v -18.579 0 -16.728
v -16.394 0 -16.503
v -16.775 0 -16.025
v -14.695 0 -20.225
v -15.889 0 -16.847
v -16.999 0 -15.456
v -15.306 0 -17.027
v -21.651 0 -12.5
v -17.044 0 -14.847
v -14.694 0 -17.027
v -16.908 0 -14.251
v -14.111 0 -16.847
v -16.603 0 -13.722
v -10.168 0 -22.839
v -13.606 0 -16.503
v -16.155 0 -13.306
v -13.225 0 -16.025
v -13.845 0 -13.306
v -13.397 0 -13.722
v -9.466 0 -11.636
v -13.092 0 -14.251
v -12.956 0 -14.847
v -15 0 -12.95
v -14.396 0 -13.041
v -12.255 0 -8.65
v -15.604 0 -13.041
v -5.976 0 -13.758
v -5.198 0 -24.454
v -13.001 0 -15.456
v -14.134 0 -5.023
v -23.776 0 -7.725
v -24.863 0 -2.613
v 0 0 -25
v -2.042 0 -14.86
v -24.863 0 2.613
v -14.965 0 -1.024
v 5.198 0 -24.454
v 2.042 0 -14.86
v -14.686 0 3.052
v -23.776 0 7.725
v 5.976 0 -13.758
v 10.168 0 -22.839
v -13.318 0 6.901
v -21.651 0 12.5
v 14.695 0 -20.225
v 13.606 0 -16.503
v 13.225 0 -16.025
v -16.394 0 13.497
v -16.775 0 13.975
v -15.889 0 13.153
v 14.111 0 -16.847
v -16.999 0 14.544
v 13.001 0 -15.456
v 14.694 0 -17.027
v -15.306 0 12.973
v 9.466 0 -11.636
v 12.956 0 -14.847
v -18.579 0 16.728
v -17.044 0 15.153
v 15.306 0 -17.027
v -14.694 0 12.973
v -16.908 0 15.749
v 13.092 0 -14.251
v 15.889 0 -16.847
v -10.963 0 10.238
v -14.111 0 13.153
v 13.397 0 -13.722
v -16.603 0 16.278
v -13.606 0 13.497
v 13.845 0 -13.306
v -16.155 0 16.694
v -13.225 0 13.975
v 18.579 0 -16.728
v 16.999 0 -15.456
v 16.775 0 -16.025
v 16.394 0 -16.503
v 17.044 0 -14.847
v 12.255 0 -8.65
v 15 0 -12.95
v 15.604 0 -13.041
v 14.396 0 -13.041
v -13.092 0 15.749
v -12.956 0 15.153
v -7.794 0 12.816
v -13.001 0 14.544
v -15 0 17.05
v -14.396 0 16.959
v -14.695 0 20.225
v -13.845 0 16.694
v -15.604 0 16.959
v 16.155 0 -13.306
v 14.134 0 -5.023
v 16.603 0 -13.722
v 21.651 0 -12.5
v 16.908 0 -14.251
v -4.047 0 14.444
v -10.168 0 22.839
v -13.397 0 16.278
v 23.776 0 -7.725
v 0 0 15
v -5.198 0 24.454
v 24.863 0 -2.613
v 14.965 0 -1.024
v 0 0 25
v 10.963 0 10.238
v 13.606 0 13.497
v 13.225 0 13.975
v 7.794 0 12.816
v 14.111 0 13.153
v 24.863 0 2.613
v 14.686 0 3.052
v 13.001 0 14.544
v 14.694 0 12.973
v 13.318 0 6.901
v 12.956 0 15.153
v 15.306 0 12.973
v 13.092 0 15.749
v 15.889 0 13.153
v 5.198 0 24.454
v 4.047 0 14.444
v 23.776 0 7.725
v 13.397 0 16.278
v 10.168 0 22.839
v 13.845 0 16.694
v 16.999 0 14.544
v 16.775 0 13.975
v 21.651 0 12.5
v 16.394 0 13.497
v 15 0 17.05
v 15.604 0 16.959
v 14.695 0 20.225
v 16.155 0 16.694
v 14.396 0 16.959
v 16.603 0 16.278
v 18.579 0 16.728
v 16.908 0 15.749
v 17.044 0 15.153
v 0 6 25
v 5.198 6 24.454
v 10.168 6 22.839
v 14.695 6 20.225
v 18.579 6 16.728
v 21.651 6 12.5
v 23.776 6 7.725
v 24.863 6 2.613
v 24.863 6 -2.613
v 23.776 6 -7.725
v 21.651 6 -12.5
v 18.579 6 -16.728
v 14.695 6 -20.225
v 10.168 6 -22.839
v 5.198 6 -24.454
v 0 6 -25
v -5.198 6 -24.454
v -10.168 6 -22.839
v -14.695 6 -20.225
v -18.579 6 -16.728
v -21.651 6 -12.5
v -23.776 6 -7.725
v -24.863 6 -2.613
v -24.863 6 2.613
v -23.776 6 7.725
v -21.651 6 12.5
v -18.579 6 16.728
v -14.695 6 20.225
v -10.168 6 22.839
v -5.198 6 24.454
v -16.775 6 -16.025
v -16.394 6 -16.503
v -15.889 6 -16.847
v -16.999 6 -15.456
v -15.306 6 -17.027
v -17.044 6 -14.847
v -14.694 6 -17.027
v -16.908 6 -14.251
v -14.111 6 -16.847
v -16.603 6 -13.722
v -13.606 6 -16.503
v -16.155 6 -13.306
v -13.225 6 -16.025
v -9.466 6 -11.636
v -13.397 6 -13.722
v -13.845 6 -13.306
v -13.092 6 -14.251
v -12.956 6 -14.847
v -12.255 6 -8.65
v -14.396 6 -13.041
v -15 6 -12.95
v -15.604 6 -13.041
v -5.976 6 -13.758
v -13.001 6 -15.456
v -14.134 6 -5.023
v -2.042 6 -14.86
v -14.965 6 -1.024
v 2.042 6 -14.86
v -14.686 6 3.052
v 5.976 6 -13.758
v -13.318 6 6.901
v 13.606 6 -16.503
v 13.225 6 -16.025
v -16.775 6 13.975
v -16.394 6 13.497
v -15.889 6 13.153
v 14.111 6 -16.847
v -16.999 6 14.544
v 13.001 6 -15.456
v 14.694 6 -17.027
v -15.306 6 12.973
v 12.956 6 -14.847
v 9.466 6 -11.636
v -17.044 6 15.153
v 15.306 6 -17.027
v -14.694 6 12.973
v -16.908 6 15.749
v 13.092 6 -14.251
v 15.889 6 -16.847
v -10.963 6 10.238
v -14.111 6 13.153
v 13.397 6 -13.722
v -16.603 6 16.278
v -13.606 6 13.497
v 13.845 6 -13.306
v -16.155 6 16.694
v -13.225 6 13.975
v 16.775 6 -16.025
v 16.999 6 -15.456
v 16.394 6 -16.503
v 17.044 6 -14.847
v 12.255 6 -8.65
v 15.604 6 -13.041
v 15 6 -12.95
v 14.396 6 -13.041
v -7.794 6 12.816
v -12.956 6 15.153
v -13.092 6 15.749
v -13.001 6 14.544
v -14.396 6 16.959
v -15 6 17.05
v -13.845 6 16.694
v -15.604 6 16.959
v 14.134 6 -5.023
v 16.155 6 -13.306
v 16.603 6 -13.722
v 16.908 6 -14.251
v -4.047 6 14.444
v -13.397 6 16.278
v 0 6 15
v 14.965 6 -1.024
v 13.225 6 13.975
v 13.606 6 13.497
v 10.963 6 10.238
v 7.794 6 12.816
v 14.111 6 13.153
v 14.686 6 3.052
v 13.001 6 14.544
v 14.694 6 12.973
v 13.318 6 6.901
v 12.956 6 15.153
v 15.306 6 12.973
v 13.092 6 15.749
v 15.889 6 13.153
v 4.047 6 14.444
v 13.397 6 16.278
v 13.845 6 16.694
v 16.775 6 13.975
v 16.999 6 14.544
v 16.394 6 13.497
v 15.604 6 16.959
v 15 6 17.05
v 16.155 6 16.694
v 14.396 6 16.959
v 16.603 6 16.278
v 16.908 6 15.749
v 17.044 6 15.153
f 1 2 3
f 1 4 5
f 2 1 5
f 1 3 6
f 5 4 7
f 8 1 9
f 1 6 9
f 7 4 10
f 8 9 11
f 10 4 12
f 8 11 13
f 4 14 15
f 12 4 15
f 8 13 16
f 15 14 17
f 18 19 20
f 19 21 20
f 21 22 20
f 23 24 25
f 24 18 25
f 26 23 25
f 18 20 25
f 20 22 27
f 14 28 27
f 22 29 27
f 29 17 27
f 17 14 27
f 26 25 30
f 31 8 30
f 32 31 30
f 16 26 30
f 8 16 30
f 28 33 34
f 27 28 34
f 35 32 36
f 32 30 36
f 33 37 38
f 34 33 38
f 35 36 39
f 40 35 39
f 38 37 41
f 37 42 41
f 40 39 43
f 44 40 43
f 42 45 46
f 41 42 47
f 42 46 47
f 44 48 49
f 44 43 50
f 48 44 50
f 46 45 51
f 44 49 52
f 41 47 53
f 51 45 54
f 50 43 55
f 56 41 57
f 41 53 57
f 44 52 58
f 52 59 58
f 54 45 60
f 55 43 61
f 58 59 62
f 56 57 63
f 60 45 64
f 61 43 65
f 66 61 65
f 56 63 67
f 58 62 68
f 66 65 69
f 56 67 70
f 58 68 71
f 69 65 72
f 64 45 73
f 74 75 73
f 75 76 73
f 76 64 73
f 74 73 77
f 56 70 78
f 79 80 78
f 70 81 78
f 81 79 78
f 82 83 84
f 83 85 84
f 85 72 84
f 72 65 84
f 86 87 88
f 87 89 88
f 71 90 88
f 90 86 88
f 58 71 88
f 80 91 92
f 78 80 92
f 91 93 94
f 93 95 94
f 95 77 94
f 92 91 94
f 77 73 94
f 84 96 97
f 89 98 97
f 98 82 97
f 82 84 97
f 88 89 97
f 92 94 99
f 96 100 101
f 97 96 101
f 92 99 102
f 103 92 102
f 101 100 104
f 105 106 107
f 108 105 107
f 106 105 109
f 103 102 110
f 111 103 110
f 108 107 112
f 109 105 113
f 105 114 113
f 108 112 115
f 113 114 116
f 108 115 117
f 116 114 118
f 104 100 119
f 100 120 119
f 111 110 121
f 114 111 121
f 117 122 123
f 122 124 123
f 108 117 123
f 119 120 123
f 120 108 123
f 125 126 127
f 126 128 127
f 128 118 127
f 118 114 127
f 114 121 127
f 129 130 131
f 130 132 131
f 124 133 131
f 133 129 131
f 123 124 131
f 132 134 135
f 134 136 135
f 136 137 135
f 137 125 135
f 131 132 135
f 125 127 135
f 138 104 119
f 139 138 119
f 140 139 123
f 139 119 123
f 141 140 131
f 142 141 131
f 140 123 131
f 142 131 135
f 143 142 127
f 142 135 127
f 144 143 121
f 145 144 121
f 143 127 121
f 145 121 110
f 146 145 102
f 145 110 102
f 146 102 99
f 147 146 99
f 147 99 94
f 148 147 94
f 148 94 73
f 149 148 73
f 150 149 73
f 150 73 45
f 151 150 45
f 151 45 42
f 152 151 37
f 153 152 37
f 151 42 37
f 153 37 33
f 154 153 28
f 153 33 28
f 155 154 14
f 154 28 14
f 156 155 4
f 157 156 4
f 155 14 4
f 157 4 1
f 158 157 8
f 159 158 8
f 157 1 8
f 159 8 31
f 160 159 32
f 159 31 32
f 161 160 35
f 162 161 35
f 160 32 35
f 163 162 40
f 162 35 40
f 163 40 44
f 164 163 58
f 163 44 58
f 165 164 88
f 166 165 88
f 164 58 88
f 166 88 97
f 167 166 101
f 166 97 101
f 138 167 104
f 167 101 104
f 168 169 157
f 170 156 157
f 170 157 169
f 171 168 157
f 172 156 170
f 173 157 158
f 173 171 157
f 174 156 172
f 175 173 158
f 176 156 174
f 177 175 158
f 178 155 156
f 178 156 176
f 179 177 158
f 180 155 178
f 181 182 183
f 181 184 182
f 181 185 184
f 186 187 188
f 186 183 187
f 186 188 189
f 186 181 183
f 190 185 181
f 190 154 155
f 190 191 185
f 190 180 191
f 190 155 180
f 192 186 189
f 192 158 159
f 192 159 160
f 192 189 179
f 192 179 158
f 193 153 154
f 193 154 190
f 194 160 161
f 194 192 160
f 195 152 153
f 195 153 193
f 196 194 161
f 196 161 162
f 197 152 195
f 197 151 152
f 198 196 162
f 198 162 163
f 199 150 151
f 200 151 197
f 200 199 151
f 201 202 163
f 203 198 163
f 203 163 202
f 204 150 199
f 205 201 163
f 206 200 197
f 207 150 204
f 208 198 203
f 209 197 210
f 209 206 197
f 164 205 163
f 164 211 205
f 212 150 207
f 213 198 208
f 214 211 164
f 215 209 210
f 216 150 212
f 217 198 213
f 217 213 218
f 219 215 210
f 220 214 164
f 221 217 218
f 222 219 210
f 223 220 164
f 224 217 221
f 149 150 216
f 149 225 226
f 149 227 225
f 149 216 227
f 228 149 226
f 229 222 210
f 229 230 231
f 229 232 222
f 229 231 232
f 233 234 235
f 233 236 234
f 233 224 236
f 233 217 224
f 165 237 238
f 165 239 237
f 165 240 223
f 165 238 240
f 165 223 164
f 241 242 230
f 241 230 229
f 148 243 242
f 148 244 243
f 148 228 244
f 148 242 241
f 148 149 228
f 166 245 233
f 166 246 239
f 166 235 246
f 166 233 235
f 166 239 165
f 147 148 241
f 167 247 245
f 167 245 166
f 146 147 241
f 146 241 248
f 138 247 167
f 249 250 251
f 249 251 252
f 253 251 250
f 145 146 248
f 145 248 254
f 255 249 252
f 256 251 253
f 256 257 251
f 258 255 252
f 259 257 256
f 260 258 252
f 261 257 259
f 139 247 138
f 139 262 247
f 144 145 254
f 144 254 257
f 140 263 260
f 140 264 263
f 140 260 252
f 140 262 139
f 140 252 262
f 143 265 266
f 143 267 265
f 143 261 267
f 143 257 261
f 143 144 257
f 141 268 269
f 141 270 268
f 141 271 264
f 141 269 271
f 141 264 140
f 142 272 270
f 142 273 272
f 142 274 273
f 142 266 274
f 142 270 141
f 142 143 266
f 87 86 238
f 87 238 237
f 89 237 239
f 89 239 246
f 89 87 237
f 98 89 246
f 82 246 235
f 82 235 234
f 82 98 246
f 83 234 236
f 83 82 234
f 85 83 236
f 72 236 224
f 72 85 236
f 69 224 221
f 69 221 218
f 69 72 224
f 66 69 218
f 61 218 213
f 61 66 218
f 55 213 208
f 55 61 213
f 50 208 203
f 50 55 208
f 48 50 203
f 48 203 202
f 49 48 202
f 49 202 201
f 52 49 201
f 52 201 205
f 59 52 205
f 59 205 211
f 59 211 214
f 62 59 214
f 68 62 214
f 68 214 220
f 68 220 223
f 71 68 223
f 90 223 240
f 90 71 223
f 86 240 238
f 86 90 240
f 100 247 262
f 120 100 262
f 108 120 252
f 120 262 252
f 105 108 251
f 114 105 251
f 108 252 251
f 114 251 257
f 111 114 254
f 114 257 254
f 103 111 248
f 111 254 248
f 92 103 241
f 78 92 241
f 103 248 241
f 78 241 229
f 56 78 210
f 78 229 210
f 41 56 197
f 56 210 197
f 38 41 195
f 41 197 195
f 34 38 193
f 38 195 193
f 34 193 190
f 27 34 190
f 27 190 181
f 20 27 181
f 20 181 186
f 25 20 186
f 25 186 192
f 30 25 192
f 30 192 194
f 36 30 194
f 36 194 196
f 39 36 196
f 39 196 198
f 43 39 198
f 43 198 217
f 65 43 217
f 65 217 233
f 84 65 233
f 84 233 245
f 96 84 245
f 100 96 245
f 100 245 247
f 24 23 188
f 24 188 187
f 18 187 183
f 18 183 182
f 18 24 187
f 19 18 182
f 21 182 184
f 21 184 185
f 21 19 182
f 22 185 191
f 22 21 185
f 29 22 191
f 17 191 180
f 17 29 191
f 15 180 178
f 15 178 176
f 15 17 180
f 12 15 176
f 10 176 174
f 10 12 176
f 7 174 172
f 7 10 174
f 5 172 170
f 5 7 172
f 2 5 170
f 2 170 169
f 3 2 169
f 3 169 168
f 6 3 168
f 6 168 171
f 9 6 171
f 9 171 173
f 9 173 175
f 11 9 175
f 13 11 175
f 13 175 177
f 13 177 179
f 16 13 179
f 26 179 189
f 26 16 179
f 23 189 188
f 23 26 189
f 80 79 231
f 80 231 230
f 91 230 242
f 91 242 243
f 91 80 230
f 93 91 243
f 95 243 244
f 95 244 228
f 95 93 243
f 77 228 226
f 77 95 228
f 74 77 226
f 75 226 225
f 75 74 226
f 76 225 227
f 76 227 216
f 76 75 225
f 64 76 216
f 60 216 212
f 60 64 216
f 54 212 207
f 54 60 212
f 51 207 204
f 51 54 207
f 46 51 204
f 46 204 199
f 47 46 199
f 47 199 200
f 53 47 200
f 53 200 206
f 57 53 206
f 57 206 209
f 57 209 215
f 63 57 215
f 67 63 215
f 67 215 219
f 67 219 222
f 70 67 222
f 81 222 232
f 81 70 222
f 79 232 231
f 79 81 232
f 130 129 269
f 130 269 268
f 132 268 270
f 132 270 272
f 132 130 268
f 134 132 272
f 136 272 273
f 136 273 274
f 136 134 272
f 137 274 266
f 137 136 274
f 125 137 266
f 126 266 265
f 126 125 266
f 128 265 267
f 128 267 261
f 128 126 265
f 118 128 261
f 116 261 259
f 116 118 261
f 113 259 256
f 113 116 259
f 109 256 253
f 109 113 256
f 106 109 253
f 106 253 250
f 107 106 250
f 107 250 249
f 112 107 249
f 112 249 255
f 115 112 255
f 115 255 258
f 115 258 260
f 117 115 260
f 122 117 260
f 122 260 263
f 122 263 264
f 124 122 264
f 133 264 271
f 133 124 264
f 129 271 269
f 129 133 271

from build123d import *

# Parameters (mm, degrees)
SKETCH_1_R          = 25
SKETCH_1_R_2        = 2.05
EXTRUDE_1_DEPTH     = 6
SKETCH_2_R          = 15
CUT_EXTRUDE_1_DEPTH = 36.860842154


with BuildPart() as part:
    # 草图1 → 凸台-拉伸1 (new body)
    with BuildSketch(Plane(origin=(0, 0, 0), x_dir=(1, 0, 0), z_dir=(0, 1, 0))):
        with Locations(Location((0, 0, 0), (0, 0, 270))):
            Circle(SKETCH_1_R)
        with Locations(Location((-15, 15, 0), (0, 0, 270))):
            Circle(SKETCH_1_R_2, mode=Mode.SUBTRACT)
        with Locations(Location((15, 15, 0), (0, 0, 270))):
            Circle(SKETCH_1_R_2, mode=Mode.SUBTRACT)
        with Locations(Location((15, -15, 0), (0, 0, 270))):
            Circle(SKETCH_1_R_2, mode=Mode.SUBTRACT)
        with Locations(Location((-15, -15, 0), (0, 0, 270))):
            Circle(SKETCH_1_R_2, mode=Mode.SUBTRACT)
    extrude(amount=EXTRUDE_1_DEPTH)

    # 草图2 → 切除-拉伸1 (cut, through all)
    with BuildSketch(Plane(origin=(0, 6, 0), x_dir=(1, 0, 0), z_dir=(0, 1, 0))):
        with Locations(Location((0, 0, 0), (0, 0, 270))):
            Circle(SKETCH_2_R)
    extrude(amount=-CUT_EXTRUDE_1_DEPTH, mode=Mode.SUBTRACT)


solid = part.part
